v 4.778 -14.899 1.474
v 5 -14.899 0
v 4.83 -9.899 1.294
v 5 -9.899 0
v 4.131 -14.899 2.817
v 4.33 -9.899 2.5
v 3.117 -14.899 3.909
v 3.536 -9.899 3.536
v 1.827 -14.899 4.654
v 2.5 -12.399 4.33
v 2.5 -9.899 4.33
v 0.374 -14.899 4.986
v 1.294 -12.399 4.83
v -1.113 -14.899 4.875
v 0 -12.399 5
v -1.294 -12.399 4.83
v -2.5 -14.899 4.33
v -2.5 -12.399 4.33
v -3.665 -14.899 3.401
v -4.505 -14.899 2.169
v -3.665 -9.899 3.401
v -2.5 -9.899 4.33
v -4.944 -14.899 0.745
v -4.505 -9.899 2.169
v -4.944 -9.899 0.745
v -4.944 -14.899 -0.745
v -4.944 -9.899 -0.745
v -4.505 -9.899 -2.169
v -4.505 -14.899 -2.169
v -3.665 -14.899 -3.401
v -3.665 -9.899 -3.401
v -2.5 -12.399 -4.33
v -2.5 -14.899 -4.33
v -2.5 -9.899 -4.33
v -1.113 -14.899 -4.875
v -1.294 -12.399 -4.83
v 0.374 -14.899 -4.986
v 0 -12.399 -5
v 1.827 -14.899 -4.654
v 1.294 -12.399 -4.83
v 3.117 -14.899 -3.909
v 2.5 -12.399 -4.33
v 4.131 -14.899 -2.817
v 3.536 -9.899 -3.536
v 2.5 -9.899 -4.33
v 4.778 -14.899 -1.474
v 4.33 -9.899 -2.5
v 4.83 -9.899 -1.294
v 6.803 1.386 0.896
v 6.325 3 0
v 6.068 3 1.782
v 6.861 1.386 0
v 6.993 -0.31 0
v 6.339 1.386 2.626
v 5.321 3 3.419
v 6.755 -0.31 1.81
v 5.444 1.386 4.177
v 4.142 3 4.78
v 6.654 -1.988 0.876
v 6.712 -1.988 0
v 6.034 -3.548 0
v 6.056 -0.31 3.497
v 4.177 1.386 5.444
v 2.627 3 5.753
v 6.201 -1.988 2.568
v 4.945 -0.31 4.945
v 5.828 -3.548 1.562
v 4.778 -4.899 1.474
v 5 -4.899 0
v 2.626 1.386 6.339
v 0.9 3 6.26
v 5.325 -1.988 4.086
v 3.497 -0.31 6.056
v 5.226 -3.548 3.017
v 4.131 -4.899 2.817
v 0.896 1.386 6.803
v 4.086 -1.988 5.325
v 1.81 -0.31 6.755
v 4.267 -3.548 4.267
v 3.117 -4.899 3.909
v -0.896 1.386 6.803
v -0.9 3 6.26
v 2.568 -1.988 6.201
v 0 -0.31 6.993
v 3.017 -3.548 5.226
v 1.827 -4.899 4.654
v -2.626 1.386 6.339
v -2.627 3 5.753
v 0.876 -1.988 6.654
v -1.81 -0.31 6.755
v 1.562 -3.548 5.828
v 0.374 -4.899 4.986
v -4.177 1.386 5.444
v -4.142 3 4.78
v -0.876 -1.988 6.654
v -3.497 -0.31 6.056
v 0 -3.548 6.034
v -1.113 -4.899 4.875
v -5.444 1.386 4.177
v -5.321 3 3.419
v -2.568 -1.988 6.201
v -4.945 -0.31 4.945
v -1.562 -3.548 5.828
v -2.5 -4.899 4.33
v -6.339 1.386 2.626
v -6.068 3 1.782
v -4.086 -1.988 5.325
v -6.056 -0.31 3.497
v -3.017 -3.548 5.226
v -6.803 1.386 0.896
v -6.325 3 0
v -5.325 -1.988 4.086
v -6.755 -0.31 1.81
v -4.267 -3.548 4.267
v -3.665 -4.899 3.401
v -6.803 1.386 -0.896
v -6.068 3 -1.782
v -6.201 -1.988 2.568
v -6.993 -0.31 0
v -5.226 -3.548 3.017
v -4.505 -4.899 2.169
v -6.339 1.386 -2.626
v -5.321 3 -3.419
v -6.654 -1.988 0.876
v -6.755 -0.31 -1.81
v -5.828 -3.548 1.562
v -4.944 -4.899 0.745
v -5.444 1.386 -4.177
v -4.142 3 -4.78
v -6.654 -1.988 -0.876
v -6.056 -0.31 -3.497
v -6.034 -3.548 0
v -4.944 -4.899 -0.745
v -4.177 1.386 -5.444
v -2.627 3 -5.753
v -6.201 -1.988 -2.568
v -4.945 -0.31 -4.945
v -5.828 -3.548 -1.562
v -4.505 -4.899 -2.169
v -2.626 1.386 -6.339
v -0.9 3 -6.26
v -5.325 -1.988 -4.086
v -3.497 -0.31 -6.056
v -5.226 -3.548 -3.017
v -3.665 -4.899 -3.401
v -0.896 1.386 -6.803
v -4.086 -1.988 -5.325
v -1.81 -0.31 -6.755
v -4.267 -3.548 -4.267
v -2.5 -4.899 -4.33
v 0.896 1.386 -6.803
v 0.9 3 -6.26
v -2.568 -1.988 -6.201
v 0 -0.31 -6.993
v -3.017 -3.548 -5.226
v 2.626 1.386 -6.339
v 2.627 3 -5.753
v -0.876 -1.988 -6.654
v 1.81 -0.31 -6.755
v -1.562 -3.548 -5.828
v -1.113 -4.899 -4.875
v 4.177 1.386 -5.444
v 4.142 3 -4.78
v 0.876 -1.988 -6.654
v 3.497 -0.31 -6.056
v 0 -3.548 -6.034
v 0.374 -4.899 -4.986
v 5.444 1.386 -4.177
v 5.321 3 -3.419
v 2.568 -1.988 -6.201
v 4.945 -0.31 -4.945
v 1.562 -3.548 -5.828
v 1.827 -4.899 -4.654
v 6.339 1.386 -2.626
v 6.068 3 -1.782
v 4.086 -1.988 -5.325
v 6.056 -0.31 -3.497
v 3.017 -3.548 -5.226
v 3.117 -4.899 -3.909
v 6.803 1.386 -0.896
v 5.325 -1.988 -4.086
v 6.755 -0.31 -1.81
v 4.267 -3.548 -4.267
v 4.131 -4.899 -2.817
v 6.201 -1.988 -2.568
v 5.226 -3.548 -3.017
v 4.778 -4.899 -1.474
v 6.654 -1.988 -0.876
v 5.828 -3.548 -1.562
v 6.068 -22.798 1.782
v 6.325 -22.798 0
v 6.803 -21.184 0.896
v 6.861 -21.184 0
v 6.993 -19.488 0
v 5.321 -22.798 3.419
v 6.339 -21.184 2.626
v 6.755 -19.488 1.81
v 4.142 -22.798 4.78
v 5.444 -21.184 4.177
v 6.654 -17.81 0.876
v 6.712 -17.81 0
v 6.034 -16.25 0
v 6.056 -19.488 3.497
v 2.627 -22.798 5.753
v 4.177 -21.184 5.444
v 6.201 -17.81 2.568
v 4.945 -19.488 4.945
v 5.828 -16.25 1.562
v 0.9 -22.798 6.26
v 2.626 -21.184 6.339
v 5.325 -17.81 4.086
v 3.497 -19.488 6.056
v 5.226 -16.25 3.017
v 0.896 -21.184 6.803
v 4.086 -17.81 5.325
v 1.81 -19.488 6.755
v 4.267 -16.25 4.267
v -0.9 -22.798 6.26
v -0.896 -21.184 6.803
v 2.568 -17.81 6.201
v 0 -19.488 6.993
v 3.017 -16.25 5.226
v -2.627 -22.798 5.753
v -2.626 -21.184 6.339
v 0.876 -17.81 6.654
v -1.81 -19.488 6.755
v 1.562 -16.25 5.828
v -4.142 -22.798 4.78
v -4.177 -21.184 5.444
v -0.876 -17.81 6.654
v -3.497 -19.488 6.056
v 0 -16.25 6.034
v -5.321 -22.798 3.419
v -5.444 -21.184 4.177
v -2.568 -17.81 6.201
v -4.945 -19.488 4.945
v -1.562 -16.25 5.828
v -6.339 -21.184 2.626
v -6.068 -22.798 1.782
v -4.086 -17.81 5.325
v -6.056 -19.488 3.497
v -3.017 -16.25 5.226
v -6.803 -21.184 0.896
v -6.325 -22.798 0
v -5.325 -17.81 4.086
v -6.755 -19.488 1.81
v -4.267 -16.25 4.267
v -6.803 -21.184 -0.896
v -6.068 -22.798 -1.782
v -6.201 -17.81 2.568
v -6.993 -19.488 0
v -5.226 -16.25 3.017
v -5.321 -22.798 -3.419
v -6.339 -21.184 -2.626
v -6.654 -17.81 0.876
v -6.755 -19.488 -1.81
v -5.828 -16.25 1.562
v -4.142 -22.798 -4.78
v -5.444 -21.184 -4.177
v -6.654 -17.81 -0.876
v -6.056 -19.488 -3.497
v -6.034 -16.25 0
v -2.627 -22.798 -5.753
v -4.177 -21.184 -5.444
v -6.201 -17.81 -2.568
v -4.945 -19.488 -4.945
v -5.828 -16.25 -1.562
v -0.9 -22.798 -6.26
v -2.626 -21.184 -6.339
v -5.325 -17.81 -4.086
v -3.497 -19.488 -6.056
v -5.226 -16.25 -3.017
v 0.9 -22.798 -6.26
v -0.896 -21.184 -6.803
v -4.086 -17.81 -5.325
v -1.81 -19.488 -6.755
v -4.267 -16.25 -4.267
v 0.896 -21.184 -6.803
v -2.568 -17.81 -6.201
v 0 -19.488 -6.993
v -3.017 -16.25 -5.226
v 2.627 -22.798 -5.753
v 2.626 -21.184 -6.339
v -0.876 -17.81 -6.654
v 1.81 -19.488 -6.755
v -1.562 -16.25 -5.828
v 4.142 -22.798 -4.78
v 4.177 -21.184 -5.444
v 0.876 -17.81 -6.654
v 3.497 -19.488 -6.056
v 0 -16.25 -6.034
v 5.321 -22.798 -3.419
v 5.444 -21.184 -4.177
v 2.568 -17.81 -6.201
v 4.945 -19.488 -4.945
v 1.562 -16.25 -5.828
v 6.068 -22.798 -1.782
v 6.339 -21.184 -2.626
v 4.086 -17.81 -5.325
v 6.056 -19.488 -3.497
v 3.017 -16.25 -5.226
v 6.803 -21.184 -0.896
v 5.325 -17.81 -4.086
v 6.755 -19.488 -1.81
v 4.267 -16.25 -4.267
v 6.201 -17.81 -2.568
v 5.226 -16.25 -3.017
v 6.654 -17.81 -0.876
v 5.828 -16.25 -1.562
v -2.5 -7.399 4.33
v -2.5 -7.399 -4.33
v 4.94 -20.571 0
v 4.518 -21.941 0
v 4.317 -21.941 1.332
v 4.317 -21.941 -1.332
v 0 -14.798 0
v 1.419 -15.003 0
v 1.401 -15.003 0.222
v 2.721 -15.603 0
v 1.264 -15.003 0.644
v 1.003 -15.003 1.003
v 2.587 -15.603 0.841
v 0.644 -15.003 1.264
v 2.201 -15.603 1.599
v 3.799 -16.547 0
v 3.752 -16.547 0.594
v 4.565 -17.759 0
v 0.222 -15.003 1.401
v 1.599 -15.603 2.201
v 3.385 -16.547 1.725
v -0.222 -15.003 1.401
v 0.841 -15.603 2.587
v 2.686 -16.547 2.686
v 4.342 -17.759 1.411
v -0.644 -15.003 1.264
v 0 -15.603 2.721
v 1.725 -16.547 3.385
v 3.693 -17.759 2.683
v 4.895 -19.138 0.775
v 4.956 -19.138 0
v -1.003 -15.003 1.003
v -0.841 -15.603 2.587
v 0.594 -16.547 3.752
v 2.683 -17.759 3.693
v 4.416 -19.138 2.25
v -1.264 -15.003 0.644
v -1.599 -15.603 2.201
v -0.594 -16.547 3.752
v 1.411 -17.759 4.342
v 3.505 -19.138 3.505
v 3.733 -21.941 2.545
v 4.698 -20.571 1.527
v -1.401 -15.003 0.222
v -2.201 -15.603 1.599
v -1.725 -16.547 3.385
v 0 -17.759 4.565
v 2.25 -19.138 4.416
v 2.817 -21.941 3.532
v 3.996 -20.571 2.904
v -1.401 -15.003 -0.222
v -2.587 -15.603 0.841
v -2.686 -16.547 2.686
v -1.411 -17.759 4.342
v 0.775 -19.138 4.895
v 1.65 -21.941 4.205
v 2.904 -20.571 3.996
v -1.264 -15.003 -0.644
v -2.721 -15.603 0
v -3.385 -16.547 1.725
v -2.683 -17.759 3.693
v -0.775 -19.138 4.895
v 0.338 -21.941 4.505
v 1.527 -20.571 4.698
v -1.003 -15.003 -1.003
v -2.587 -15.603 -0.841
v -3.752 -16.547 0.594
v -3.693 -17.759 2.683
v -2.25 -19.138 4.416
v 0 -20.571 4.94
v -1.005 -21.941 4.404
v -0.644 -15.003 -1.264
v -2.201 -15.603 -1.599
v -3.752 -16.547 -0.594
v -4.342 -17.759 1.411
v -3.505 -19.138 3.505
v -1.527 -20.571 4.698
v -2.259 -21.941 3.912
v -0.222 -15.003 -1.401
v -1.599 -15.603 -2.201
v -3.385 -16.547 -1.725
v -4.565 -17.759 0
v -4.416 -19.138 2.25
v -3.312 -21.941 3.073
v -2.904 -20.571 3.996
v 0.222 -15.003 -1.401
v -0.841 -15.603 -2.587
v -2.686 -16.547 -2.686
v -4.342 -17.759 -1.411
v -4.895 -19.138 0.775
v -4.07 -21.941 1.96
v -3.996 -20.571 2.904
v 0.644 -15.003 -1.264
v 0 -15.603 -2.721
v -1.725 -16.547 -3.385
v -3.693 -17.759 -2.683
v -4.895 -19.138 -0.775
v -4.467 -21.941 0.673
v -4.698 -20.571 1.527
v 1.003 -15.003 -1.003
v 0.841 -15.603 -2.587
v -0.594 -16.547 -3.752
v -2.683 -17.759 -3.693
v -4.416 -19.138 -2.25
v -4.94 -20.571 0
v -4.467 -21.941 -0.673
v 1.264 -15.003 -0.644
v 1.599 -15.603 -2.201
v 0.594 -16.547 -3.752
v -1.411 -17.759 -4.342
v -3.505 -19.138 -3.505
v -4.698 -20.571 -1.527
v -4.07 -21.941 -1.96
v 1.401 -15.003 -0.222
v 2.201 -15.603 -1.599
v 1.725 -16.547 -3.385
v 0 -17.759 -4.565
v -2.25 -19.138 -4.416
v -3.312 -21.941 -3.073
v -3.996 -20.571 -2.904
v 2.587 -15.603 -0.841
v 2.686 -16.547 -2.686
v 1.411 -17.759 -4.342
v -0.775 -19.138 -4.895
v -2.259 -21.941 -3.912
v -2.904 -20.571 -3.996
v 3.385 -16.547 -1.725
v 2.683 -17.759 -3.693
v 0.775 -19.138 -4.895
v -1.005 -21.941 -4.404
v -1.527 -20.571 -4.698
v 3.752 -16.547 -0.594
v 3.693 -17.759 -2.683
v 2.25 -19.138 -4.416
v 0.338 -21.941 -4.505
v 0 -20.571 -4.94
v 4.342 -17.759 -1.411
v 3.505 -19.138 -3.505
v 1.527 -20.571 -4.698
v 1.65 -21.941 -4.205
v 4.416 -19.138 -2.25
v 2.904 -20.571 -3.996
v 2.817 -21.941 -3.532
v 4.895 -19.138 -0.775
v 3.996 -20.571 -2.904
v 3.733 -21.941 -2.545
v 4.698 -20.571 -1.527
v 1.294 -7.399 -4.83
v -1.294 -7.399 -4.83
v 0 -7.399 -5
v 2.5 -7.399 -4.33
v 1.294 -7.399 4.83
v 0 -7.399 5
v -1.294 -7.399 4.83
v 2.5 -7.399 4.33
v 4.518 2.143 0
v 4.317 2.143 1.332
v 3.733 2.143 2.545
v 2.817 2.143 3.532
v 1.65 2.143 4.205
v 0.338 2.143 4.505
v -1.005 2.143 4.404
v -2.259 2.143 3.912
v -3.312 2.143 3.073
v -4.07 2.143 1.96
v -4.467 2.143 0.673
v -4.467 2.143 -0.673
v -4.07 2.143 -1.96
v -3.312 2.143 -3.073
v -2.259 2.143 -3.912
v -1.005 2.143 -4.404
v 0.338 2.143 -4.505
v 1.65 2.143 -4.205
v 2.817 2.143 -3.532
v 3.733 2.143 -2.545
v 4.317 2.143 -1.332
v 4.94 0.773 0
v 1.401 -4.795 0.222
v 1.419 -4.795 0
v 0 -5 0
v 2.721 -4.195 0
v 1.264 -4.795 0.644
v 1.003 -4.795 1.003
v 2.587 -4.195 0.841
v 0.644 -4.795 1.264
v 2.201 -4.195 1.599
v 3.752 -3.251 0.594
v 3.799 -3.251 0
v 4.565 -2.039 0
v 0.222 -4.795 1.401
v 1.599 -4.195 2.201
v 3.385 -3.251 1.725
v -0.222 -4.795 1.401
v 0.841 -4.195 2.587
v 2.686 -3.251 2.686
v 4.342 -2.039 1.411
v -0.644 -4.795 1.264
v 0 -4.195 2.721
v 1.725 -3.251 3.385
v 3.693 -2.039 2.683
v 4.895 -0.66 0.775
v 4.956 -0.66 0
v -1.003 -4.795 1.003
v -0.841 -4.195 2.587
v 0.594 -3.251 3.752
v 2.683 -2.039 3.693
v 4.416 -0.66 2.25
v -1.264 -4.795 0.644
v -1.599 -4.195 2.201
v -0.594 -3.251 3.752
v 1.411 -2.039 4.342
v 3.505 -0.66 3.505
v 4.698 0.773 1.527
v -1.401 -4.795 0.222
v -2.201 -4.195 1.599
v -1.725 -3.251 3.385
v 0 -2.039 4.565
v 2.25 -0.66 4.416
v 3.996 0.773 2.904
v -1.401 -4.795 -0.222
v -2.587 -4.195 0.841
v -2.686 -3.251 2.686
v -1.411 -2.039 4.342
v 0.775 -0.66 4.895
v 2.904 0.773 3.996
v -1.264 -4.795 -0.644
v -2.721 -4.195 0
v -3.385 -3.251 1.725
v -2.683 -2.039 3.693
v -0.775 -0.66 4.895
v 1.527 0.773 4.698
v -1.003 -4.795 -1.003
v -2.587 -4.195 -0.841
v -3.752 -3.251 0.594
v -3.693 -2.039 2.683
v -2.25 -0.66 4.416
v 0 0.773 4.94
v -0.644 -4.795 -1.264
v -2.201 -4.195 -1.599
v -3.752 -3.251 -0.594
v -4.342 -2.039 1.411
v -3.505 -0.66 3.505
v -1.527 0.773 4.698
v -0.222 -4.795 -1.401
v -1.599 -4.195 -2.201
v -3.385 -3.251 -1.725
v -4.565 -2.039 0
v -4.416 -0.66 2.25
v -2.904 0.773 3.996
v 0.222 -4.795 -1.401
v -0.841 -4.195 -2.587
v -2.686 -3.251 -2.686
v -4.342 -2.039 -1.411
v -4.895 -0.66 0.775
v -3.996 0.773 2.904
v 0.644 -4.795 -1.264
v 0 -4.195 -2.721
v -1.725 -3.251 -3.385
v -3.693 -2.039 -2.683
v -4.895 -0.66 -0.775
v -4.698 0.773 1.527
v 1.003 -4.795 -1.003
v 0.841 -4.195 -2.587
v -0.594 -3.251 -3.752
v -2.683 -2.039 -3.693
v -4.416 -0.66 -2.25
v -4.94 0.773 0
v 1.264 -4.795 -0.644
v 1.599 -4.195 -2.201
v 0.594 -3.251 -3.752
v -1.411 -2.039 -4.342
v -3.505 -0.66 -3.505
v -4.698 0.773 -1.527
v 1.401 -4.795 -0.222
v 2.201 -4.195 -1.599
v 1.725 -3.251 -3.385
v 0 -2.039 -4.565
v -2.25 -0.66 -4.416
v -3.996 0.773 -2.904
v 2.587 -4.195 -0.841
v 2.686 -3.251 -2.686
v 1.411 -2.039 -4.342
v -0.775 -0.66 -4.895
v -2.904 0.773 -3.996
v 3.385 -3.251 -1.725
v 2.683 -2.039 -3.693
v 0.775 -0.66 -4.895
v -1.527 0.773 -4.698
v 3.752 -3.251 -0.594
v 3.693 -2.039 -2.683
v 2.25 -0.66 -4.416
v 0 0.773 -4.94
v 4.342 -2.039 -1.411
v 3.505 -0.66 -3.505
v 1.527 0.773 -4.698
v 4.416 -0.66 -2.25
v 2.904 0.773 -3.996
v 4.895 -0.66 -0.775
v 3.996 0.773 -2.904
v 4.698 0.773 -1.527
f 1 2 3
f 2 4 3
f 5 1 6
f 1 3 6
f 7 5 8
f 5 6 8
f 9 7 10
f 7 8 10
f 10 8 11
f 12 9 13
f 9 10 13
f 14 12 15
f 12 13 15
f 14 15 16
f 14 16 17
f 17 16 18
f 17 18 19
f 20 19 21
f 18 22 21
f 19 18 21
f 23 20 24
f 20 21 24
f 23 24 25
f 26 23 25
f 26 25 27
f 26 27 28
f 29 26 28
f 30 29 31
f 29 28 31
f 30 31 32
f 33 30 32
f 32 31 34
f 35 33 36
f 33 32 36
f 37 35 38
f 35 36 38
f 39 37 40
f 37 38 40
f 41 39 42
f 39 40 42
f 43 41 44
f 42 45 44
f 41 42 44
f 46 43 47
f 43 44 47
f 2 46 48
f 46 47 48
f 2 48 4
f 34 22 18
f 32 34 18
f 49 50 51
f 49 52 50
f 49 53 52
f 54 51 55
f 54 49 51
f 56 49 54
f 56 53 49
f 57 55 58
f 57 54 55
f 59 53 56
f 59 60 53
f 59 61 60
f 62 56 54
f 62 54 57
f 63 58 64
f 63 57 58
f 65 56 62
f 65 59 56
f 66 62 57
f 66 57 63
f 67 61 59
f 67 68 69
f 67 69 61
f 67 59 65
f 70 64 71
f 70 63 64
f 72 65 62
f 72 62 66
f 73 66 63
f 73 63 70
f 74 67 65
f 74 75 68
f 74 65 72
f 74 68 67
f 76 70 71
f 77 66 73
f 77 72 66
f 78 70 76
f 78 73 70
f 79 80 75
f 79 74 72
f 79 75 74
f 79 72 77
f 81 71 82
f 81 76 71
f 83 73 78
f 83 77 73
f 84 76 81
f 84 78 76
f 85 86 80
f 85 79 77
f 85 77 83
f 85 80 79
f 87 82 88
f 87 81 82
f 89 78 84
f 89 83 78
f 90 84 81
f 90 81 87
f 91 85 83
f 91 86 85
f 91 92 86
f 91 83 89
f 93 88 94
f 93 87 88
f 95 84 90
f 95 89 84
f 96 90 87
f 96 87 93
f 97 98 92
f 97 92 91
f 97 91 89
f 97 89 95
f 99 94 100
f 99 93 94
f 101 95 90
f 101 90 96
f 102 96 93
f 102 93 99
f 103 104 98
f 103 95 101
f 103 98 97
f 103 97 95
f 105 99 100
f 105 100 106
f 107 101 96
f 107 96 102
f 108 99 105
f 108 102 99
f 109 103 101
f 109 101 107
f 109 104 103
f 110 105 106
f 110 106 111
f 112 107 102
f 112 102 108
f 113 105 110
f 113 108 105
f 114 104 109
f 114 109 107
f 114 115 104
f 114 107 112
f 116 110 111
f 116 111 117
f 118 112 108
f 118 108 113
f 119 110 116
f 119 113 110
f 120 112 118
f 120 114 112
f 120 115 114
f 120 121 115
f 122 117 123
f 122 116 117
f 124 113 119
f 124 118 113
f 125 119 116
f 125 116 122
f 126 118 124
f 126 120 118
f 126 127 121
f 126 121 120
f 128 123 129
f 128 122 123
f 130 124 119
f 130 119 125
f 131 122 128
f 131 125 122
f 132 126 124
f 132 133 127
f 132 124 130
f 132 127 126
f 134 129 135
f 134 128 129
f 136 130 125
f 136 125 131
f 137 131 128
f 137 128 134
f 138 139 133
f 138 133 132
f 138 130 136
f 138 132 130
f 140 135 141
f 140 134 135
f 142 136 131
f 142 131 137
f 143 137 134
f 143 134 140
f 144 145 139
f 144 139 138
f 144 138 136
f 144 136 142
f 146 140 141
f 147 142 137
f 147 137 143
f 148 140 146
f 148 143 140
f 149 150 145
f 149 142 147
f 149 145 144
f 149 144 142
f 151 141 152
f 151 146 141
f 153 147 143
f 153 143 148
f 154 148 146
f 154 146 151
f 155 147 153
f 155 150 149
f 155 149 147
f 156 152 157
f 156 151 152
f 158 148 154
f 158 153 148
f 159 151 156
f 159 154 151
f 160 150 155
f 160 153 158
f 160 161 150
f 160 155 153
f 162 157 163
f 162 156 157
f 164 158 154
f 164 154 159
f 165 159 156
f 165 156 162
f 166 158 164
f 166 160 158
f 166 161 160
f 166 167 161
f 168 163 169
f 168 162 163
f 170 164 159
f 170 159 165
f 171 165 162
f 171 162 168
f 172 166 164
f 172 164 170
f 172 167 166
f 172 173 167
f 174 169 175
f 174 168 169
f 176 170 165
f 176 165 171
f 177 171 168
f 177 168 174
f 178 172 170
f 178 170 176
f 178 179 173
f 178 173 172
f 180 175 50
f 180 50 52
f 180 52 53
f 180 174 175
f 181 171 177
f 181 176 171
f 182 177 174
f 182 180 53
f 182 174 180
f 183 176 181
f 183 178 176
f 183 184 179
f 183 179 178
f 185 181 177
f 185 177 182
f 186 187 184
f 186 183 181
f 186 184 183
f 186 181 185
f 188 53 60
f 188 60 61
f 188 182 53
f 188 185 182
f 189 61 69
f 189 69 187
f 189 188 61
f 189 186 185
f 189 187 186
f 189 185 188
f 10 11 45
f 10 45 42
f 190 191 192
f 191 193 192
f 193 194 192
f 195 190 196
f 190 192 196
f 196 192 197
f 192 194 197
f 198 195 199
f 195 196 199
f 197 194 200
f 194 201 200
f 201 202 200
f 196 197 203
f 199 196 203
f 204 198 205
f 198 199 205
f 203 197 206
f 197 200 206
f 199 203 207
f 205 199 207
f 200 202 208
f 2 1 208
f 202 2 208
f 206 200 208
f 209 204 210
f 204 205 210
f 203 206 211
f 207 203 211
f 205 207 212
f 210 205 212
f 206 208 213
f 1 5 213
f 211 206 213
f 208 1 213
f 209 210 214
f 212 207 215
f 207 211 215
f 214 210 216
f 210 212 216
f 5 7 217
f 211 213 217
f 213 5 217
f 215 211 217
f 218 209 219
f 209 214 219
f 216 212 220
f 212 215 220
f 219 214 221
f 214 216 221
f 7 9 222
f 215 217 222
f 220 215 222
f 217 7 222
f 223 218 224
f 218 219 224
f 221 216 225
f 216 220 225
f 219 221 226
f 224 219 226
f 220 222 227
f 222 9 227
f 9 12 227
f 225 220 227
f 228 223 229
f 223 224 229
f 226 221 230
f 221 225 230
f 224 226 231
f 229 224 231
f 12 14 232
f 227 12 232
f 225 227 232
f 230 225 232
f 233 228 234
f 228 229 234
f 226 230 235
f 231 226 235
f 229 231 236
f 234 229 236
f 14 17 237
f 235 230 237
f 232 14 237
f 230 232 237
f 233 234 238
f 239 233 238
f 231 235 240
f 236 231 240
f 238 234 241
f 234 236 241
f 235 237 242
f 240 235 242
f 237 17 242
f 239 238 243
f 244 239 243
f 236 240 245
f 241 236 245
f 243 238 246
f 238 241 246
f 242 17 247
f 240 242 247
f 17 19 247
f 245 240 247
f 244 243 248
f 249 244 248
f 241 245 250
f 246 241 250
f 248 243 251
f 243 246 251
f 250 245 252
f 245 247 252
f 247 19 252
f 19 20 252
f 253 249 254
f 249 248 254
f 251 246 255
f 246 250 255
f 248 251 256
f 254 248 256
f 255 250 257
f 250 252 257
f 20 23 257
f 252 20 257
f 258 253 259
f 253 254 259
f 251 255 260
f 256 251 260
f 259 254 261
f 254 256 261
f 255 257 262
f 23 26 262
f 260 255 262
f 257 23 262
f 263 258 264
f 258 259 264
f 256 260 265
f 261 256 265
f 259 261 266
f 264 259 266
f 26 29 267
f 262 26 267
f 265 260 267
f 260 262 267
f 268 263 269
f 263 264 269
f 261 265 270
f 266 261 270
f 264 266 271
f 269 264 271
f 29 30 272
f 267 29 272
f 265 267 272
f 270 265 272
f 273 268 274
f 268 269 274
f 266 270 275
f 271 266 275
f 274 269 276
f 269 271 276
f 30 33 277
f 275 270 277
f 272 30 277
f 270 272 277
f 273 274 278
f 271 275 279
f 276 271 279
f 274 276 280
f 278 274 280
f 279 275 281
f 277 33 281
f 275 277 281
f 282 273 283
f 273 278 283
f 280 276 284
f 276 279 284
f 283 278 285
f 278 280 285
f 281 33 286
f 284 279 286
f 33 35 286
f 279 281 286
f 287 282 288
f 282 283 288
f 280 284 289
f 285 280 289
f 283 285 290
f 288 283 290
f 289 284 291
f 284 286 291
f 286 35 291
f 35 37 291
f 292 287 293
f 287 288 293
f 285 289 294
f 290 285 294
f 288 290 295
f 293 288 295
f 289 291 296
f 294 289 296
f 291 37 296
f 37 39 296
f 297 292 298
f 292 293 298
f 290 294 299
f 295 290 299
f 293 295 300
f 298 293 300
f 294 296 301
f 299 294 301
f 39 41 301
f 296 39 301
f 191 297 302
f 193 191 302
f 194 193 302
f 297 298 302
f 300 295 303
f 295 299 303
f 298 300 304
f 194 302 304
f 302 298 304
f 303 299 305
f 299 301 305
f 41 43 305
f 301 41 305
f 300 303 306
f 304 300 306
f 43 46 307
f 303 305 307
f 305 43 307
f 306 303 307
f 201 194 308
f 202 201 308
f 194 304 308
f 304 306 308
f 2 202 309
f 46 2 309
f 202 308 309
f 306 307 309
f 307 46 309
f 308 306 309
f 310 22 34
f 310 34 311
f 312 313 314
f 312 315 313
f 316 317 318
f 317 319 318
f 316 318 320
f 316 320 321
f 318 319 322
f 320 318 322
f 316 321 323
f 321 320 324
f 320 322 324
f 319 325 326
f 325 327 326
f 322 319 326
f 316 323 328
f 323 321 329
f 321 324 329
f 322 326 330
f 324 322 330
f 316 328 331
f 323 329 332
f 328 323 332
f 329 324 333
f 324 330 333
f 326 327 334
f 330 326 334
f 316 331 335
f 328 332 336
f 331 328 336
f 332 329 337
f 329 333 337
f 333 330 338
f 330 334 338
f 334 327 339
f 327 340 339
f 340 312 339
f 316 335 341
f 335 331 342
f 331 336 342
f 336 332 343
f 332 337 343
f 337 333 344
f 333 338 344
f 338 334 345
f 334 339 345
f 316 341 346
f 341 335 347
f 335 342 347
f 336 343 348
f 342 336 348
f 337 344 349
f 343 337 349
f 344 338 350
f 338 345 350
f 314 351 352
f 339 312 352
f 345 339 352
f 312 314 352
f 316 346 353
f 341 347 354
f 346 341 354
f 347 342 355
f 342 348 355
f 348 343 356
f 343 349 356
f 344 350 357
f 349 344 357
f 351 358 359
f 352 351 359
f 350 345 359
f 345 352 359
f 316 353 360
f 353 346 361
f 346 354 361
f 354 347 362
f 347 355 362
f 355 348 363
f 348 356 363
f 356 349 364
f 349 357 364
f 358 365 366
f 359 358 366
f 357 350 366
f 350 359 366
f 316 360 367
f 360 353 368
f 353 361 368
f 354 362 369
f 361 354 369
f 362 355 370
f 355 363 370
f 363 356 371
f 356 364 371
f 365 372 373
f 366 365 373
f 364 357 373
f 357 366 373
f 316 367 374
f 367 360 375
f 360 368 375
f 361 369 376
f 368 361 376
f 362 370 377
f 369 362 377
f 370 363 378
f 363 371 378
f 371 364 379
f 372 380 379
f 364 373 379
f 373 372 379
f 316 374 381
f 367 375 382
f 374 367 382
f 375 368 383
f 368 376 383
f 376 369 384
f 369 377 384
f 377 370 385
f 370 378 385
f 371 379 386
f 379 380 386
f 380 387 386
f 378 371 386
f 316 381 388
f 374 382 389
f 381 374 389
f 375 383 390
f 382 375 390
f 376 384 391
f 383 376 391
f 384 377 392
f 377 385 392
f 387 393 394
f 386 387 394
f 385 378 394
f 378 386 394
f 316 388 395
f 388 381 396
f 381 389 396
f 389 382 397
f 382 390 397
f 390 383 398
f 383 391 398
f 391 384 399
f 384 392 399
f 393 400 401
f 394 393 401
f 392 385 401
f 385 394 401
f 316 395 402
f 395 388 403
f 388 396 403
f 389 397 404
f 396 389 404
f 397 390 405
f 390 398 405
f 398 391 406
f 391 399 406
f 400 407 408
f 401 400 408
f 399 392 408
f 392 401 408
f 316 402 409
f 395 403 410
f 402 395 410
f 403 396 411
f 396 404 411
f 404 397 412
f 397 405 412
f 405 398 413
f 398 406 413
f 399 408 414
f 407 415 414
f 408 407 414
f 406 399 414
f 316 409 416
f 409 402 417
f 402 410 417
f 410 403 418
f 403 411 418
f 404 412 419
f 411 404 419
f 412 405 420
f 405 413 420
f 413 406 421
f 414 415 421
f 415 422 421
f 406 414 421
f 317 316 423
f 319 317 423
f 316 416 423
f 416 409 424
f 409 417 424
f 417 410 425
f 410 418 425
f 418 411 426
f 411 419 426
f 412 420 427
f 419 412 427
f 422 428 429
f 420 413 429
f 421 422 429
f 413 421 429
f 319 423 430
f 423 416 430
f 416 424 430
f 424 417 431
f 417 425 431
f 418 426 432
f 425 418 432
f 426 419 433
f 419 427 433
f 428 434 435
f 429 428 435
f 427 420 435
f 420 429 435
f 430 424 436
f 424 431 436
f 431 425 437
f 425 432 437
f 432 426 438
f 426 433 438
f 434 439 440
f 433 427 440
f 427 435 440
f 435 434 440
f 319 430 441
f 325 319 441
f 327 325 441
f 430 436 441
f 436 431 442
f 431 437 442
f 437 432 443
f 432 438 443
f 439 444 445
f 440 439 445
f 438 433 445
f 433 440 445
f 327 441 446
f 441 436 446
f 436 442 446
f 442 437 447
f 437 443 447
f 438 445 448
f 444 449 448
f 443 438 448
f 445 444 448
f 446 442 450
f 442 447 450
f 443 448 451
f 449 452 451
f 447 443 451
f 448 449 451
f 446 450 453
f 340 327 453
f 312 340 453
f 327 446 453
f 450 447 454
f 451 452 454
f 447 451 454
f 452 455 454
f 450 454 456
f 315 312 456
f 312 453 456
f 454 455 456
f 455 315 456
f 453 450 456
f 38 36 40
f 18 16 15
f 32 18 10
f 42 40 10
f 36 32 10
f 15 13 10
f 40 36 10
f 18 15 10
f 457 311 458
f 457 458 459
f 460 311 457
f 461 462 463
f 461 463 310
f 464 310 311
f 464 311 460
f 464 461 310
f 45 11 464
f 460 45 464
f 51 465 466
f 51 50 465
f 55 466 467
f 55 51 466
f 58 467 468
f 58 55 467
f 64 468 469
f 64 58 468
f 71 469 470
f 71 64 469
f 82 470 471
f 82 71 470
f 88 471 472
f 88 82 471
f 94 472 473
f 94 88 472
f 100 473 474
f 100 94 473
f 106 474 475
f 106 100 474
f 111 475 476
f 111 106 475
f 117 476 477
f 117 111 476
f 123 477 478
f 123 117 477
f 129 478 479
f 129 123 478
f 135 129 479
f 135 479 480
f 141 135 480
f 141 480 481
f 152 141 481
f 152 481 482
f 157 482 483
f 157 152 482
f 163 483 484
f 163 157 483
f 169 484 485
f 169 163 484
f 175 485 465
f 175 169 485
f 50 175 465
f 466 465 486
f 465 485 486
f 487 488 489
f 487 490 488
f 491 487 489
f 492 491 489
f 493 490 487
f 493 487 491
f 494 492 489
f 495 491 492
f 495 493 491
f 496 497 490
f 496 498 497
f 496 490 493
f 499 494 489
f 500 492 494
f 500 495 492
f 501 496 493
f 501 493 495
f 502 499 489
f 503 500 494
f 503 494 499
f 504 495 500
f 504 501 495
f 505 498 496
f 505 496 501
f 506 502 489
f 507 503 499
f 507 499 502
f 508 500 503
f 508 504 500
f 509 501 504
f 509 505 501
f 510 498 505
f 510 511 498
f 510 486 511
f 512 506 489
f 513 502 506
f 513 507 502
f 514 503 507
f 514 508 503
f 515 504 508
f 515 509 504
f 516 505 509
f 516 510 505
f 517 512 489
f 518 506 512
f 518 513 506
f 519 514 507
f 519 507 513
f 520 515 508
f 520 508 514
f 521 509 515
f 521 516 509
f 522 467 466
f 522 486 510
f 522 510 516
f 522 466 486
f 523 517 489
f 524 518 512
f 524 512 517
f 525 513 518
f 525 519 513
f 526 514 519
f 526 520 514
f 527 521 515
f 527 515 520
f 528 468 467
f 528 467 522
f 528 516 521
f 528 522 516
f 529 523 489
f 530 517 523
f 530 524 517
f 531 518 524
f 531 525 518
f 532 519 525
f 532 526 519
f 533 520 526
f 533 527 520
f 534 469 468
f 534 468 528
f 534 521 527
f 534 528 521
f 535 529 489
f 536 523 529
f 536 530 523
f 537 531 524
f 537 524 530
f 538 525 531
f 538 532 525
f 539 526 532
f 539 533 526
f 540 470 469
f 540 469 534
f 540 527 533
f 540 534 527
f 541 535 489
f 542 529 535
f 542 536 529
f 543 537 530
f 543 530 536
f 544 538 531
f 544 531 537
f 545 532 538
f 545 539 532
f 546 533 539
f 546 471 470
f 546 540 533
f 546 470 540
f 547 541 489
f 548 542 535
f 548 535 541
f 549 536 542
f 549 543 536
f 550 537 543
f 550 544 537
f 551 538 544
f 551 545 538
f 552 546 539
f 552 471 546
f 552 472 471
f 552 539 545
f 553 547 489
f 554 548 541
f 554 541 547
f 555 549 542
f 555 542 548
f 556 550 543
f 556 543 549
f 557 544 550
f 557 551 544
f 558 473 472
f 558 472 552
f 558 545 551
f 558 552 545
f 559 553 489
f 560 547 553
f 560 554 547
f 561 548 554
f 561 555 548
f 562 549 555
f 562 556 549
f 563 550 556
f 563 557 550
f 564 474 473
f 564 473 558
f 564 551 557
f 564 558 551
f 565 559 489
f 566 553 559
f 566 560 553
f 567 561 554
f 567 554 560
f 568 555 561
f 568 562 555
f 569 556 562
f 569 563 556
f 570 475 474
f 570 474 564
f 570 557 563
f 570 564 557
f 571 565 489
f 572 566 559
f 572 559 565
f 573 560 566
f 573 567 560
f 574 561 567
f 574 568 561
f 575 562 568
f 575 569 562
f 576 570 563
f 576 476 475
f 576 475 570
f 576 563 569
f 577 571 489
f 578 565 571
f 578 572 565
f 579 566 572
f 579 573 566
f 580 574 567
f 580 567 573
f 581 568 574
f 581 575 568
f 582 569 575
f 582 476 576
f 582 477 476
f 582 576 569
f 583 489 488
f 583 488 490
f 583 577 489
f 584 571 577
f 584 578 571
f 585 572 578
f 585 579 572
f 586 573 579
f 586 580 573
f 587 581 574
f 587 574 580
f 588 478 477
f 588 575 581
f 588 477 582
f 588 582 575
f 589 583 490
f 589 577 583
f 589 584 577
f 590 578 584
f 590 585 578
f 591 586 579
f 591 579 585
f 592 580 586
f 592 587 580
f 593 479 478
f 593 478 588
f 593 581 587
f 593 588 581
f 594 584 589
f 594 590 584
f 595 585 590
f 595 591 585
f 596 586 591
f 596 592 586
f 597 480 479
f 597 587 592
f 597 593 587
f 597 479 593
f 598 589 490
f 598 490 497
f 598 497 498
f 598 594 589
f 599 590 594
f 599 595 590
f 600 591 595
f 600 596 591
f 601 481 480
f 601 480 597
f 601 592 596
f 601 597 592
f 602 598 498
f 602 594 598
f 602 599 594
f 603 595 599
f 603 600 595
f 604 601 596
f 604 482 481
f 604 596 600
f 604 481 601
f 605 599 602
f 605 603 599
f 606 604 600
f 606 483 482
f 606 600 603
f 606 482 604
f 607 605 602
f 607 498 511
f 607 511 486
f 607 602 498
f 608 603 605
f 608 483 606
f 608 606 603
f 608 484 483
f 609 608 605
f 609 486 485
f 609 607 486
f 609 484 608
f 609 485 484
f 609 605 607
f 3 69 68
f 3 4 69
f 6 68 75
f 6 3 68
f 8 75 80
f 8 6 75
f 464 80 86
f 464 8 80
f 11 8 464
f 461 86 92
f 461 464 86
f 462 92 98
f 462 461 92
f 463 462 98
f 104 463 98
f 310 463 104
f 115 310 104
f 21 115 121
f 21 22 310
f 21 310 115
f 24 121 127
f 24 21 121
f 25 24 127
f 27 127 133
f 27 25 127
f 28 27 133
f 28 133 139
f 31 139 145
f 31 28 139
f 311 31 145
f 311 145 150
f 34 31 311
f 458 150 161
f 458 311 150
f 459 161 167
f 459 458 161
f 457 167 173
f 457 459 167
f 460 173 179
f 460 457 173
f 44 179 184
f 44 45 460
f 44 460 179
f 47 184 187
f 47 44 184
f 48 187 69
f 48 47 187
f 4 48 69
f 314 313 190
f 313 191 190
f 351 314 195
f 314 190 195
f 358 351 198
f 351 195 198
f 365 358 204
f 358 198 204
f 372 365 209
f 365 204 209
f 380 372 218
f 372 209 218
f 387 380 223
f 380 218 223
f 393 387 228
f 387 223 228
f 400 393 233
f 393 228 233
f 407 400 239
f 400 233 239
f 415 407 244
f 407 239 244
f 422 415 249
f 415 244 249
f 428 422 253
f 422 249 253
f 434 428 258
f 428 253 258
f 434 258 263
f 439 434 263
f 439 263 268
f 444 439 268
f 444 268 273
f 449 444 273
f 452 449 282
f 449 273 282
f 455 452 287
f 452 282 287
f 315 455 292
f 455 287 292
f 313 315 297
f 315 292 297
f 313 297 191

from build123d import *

# Parameters (mm, degrees)
SKETCH3_W          = 5
SKETCH3_H          = 2.5
CUT_EXTRUDE1_DEPTH = 14.999635526


with BuildPart() as part:
    # Sketch1 → Revolve1 (revolve)
    with BuildSketch(Plane.XY):
        with BuildLine():
            Line((5, -4.898979486), (5, -9.898979486))
            Line((5, -9.898979486), (0, -9.898979486))
            Line((0, -9.898979486), (0, -5))
            ThreePointArc((0, -5), (4.225771274, -2.672612419), (4.517539515, 2.142857143))
            Line((4.517539515, 2.142857143), (6.32455532, 3))
            ThreePointArc((6.32455532, 3), (6.903611919, -1.157645227), (5, -4.898979486))
        make_face()
    revolve1 = revolve(axis=Axis((0, 12.862963673, 0), (0, -1, 0)))

    # Sketch3 → Cut-Extrude1 (cut, symmetric)
    with BuildSketch(Plane.XY):
        with Locations((0, -8.648979486)):
            Rectangle(SKETCH3_W, SKETCH3_H)
    cut_extrude1 = extrude(amount=CUT_EXTRUDE1_DEPTH, both=True, mode=Mode.SUBTRACT)

    # Mirror1: Revolve1, Cut-Extrude1 across plane
    add(revolve1.mirror(Plane(origin=(5, -9.898979486, 0), x_dir=(0, 0, 1), z_dir=(0, 1, 0))))
    add(cut_extrude1.mirror(Plane(origin=(5, -9.898979486, 0), x_dir=(0, 0, 1), z_dir=(0, 1, 0))), mode=Mode.SUBTRACT)


solid = part.part
